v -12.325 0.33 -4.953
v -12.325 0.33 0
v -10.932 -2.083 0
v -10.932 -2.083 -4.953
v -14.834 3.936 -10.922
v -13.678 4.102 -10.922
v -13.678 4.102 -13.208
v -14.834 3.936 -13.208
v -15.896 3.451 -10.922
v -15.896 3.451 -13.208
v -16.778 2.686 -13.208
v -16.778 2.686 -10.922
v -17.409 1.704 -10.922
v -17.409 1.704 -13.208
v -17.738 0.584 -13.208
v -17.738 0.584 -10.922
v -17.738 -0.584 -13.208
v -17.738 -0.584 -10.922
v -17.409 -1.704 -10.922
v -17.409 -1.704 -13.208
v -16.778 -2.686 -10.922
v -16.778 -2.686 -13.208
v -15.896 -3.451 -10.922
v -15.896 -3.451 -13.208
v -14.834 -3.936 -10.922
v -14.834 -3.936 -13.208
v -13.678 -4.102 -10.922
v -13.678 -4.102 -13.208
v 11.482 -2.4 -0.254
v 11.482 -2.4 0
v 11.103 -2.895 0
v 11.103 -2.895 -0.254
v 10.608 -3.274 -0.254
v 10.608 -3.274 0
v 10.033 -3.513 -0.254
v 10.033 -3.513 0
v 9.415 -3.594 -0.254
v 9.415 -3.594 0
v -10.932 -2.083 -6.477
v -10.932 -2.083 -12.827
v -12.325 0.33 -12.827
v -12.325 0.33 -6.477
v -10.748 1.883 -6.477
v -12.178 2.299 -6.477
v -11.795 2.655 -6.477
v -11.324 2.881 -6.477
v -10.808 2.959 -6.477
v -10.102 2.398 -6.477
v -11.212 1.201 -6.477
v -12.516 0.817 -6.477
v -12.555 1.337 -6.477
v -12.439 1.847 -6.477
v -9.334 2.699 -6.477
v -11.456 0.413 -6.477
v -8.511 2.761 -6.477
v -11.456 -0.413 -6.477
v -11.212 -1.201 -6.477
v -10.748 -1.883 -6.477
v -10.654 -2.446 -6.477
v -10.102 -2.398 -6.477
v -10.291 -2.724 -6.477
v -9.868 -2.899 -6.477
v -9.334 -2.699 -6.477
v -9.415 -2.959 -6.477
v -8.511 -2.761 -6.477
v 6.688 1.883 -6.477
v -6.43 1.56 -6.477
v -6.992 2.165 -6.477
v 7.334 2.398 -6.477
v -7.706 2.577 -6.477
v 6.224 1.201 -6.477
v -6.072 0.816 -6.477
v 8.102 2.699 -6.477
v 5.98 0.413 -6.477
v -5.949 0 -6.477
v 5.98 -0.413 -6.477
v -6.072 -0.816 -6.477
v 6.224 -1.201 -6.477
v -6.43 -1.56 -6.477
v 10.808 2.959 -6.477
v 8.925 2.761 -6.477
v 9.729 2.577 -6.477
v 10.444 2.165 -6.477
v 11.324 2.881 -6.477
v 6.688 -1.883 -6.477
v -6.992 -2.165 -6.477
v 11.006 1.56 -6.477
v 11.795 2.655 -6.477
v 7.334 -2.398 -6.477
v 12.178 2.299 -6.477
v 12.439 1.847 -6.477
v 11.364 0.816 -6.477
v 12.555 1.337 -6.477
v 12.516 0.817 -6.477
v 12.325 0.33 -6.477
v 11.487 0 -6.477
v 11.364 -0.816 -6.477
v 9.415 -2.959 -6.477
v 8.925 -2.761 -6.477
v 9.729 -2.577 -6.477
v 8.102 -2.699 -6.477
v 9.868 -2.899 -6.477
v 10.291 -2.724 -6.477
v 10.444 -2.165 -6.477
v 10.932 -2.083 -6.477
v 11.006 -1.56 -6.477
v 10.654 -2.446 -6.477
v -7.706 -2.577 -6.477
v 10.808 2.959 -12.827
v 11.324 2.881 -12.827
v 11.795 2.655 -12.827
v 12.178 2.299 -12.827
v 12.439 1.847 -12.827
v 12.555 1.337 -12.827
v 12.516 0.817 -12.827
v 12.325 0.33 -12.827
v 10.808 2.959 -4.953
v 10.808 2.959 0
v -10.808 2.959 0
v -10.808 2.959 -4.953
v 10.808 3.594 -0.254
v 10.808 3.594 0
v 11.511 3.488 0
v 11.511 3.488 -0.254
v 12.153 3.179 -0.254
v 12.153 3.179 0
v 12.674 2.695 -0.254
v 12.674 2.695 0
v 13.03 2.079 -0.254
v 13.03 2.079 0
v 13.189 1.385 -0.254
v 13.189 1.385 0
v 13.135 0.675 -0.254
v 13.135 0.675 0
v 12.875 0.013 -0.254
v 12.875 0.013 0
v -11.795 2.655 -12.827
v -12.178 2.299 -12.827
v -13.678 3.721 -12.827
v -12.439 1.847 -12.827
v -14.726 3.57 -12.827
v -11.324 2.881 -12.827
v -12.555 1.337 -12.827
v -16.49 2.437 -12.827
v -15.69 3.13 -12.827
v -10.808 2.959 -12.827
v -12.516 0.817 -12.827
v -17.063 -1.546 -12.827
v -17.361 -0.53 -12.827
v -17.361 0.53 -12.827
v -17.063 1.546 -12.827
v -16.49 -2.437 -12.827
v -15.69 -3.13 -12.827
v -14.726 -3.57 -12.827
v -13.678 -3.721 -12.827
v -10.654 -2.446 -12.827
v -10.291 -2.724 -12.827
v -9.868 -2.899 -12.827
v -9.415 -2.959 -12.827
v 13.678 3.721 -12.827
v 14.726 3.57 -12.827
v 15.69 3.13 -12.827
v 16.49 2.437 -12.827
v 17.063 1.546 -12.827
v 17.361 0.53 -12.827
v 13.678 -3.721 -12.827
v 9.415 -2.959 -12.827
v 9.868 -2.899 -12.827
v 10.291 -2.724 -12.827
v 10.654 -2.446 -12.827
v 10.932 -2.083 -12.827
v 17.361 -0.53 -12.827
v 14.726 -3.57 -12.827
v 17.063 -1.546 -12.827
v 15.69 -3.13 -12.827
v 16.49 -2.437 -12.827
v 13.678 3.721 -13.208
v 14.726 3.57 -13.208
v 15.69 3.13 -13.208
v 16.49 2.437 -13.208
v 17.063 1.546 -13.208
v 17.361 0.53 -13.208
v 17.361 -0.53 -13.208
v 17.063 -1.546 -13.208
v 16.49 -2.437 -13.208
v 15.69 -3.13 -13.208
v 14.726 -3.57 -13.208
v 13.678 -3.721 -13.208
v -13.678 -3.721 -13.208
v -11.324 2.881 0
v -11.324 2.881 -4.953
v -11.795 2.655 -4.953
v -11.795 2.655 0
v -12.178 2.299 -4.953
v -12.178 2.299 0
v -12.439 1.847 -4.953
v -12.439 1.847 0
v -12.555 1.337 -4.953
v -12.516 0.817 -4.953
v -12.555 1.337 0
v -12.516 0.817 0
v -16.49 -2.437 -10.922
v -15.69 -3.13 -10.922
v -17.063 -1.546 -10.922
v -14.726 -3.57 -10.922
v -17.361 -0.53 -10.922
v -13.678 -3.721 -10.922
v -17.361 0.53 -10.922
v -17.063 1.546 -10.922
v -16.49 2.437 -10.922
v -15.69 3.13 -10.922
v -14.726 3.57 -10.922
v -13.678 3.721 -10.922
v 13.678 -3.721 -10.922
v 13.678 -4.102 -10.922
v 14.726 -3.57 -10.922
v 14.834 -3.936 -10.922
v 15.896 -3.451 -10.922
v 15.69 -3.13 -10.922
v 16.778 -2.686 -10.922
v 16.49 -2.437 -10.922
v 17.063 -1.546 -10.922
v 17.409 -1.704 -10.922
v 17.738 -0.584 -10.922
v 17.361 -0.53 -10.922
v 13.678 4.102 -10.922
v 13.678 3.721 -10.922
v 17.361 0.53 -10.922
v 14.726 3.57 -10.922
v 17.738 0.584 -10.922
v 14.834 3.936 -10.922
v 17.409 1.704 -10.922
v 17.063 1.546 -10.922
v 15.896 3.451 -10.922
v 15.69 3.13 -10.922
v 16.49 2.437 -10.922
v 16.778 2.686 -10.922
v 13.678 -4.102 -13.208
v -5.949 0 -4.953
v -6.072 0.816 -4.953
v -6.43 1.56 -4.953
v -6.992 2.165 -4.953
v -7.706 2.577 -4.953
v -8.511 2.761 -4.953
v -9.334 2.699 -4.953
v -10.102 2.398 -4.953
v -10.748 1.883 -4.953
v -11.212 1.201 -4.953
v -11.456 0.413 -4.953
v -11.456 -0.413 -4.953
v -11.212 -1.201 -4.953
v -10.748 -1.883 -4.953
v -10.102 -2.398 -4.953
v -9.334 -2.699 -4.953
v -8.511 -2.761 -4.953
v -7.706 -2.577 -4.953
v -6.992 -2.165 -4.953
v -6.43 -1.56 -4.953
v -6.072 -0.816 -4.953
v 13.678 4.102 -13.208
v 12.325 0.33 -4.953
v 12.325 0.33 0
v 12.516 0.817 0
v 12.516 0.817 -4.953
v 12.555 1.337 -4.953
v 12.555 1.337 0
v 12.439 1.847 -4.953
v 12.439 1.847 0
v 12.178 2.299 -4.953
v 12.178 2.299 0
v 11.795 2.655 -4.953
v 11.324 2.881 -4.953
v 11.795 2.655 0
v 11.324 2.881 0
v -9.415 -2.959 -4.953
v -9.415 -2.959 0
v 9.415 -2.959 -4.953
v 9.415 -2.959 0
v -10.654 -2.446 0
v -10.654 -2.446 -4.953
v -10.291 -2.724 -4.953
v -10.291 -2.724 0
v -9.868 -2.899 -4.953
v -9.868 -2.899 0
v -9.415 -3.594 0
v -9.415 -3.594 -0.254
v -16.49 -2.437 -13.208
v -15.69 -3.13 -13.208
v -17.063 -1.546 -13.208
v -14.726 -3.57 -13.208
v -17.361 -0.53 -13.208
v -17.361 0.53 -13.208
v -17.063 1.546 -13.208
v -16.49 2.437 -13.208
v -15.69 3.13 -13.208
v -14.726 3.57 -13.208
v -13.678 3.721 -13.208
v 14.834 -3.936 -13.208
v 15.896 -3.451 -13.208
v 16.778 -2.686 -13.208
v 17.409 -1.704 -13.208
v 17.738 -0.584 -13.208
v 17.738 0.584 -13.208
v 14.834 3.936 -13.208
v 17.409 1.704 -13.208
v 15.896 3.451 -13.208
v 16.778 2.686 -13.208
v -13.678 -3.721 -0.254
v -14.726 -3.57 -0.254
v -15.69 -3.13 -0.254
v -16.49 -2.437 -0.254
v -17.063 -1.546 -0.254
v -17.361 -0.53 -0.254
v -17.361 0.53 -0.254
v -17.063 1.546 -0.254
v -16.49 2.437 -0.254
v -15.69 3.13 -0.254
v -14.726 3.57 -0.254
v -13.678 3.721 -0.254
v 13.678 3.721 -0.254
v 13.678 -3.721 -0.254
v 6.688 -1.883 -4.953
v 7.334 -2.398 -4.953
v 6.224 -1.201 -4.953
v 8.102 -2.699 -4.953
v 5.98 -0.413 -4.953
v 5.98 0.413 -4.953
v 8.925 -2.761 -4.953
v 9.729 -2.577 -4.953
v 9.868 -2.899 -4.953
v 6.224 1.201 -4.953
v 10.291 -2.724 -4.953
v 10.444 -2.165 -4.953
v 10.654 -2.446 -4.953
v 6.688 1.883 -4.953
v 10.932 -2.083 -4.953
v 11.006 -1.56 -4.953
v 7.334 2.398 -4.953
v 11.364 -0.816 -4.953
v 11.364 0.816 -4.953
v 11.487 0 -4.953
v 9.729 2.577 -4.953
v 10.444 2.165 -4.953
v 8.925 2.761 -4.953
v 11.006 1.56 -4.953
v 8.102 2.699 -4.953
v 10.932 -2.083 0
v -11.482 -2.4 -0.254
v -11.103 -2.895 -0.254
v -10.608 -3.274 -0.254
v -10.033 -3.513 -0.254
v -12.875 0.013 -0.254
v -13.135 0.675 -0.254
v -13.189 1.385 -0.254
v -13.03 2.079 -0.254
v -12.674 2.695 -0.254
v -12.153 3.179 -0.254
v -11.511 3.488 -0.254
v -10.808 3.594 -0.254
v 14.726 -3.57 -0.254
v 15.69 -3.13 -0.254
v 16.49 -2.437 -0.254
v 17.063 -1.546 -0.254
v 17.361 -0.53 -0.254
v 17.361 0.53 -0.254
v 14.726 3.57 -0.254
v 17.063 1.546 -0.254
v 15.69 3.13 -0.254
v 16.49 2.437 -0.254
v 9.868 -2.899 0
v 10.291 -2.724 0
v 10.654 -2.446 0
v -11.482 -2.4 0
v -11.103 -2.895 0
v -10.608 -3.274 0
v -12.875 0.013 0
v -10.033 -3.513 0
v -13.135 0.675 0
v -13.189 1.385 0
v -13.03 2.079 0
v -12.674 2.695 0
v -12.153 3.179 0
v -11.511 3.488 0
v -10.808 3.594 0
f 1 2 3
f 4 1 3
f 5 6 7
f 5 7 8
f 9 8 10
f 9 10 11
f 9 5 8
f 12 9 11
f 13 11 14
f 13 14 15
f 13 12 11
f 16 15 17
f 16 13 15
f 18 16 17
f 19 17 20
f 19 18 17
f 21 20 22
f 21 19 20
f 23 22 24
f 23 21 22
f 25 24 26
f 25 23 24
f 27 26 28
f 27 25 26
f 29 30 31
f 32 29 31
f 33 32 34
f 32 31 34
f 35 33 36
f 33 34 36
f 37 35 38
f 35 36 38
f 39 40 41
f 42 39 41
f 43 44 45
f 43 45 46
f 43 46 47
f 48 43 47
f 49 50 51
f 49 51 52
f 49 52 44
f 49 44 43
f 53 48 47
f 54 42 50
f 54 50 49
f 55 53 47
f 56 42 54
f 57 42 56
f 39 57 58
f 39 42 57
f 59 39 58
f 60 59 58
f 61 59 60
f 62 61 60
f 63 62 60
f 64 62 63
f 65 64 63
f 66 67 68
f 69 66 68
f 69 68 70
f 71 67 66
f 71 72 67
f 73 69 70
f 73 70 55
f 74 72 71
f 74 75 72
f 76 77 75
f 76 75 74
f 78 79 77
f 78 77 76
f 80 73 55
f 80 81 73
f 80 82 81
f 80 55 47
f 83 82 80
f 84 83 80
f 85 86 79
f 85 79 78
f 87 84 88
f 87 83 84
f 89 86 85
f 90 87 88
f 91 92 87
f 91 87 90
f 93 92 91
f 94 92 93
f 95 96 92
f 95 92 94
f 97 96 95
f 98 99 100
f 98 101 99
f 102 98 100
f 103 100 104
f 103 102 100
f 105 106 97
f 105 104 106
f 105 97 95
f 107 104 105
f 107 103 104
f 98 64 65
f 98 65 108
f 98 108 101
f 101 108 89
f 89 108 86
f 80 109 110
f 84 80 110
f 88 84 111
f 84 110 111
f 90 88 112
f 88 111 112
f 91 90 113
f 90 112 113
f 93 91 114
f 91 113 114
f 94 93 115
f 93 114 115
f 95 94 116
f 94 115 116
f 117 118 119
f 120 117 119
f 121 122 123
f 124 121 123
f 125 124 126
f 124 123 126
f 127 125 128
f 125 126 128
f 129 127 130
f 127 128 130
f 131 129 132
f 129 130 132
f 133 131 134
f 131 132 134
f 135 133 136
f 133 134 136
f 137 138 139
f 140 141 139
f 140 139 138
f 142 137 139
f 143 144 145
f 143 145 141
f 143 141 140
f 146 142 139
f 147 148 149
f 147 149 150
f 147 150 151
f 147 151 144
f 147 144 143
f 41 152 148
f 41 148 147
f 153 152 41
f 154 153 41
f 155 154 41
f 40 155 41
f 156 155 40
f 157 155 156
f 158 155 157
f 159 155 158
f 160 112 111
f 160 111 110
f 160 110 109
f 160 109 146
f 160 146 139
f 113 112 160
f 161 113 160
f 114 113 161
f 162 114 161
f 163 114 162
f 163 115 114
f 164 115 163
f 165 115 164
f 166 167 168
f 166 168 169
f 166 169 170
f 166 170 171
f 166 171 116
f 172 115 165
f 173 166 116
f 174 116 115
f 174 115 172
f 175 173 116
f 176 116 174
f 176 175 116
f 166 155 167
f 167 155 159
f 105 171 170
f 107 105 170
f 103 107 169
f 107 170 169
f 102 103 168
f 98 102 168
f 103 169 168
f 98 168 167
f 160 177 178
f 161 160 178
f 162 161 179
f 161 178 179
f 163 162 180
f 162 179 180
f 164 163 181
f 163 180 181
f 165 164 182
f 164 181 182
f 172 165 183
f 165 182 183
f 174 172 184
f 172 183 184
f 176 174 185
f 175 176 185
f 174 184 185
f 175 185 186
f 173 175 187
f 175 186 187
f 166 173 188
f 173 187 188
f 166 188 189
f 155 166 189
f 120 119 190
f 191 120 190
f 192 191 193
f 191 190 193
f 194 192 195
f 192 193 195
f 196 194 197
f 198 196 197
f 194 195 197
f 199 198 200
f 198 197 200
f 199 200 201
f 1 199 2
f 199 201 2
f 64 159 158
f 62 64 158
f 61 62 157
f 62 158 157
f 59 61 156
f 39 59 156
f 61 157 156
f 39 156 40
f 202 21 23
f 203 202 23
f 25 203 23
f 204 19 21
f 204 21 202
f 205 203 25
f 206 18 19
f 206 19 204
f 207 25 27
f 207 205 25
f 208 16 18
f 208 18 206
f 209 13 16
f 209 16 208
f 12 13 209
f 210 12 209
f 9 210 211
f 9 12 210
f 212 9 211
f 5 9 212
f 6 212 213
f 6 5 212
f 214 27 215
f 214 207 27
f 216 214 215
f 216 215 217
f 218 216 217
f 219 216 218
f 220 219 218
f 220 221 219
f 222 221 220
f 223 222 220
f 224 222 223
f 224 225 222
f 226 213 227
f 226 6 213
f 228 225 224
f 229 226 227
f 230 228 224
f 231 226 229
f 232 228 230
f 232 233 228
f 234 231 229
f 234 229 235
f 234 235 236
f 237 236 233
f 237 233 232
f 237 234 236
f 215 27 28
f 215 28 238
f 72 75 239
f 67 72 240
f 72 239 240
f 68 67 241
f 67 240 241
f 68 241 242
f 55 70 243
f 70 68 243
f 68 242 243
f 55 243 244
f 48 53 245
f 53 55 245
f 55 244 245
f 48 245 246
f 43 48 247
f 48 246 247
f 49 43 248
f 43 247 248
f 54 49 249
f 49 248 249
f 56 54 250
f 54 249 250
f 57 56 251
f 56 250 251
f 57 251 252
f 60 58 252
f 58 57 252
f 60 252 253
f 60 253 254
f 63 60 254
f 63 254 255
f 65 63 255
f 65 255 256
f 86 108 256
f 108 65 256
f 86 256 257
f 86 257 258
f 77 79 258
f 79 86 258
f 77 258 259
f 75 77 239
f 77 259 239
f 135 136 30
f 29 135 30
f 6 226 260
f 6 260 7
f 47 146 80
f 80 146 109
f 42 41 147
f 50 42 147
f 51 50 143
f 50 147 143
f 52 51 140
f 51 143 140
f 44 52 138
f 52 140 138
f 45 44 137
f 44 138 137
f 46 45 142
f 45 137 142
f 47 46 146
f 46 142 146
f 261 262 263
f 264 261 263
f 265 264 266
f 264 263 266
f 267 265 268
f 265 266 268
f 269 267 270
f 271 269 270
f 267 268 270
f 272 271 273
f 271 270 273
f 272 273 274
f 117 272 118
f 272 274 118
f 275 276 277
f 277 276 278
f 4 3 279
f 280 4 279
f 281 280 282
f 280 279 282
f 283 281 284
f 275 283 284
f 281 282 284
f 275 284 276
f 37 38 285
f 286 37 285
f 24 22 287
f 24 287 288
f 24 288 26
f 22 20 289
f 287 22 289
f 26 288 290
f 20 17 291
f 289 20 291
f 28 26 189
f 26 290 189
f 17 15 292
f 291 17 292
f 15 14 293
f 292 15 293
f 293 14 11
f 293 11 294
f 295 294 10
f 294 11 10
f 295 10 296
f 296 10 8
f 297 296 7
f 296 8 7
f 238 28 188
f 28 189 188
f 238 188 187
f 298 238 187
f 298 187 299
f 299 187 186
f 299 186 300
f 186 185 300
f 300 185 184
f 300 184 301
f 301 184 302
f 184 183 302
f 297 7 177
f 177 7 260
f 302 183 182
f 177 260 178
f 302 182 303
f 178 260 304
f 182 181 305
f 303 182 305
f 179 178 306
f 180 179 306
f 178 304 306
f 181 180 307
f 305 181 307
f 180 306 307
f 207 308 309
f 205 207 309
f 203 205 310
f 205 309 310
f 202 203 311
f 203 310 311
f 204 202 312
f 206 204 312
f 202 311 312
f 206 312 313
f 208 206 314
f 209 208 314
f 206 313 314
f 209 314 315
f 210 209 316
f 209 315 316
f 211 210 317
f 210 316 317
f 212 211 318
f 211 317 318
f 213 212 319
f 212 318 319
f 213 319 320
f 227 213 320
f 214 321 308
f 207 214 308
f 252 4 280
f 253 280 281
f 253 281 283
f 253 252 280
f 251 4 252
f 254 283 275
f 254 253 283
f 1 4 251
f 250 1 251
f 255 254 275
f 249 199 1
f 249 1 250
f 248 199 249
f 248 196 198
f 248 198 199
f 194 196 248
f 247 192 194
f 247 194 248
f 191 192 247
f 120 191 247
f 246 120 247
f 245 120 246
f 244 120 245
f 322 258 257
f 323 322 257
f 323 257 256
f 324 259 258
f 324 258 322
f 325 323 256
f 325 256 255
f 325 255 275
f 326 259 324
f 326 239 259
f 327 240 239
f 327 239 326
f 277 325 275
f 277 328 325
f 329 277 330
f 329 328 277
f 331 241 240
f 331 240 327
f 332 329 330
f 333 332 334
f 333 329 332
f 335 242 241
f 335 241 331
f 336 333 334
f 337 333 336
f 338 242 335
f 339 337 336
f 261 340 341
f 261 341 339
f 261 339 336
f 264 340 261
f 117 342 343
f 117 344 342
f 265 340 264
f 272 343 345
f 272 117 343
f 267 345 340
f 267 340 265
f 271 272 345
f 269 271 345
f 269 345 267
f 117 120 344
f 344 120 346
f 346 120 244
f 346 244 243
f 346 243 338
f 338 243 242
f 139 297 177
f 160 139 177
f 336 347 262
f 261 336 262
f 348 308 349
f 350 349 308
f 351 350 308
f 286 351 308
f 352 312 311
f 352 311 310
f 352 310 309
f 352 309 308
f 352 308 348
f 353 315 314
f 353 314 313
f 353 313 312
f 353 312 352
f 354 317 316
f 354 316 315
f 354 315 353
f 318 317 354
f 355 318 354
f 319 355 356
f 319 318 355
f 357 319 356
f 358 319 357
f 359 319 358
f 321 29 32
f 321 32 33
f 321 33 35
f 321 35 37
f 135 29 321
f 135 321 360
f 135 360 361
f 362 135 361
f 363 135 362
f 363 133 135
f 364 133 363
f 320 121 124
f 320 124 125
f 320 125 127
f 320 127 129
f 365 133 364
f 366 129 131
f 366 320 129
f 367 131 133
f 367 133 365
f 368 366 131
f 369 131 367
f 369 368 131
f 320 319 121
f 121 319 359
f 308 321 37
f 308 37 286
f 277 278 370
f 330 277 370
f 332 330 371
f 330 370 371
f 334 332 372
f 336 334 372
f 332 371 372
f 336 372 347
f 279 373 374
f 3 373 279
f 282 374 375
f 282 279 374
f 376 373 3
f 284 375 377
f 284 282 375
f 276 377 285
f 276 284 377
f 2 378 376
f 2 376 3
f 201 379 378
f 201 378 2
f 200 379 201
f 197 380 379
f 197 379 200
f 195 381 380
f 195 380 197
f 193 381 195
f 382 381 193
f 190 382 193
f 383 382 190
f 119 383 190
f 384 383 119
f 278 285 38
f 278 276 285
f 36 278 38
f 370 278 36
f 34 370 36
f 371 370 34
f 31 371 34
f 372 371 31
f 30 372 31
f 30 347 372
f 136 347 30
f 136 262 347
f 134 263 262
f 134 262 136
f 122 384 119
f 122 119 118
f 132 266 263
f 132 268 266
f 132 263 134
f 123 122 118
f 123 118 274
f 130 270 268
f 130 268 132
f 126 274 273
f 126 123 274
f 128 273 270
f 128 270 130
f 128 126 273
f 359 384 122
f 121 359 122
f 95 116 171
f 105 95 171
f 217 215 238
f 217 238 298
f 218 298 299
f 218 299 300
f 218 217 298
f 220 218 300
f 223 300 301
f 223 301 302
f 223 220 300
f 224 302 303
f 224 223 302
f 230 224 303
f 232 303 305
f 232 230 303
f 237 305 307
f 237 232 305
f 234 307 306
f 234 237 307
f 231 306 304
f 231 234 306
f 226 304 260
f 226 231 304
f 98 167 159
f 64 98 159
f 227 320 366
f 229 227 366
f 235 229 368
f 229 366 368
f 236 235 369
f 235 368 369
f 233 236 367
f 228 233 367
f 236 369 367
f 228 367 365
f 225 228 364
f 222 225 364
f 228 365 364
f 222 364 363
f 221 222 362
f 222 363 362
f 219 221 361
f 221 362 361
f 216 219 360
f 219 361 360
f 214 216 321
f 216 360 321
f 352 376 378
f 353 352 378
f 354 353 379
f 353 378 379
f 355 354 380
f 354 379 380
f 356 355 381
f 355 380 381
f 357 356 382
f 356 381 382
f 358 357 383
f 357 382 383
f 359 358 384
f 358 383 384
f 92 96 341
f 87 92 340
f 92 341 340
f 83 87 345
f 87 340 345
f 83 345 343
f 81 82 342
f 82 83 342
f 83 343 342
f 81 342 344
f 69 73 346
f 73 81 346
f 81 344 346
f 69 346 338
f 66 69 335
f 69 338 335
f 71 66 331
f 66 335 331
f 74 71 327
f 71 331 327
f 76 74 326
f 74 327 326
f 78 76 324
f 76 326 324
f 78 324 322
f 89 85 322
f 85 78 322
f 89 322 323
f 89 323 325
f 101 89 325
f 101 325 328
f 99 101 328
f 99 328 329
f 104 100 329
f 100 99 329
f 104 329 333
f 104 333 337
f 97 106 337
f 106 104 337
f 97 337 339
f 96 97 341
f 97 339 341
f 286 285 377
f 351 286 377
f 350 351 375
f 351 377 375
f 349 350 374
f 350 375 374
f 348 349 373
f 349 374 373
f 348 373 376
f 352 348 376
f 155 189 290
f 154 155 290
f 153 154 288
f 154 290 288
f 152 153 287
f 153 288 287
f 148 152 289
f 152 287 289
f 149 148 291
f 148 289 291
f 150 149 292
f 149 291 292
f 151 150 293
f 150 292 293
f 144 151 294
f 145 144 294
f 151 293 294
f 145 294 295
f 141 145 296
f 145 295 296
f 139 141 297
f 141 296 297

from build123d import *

# Parameters (mm, degrees)
F0_R     = 2.7686
F1_DEPTH = 13.208
F2_DEPTH = 10.922
F3_DEPTH = 0.254
F4_DEPTH = 4.953
F5_R     = 2.7686
F6_DEPTH = 6.731
F7_DEPTH = 0.381


with BuildPart() as f1:
    # F0 (on Top) → F1 (new body)
    with BuildSketch(Plane.XY):
        with BuildLine():
            Line((-13.6779, -4.1021), (13.6779, -4.1021))
            ThreePointArc((13.6779, -4.1021), (17.78, 0), (13.6779, 4.1021))
            Line((13.6779, 4.1021), (-13.6779, 4.1021))
            ThreePointArc((-13.6779, 4.1021), (-17.78, 0), (-13.6779, -4.1021))
        make_face()
        with BuildLine():
            ThreePointArc((-13.6779, -3.7211), (-17.399, 0), (-13.6779, 3.7211))
            Line((-13.6779, 3.7211), (13.6779, 3.7211))
            ThreePointArc((13.6779, 3.7211), (17.399, 0), (13.6779, -3.7211))
            Line((13.6779, -3.7211), (-13.6779, -3.7211))
        make_face(mode=Mode.SUBTRACT)
        with BuildLine():
            Line((13.6779, 3.7211), (-13.6779, 3.7211))
            ThreePointArc((-13.6779, 3.7211), (-17.399, 0), (-13.6779, -3.7211))
            Line((-13.6779, -3.7211), (13.6779, -3.7211))
            ThreePointArc((13.6779, -3.7211), (17.399, 0), (13.6779, 3.7211))
        make_face()
        with BuildLine():
            ThreePointArc((-12.875422, 0.0127), (-12.875422, 2.4003), (-10.8077, 3.5941))
            Line((-10.8077, 3.5941), (10.8077, 3.5941))
            ThreePointArc((10.8077, 3.5941), (12.875422, 2.4003), (12.875422, 0.0127))
            Line((12.875422, 0.0127), (11.482276, -2.4003))
            ThreePointArc((11.482276, -2.4003), (10.608354, -3.274222), (9.414554, -3.5941))
            Line((9.414554, -3.5941), (-9.414554, -3.5941))
            ThreePointArc((-9.414554, -3.5941), (-10.608354, -3.274222), (-11.482276, -2.4003))
            Line((-11.482276, -2.4003), (-12.875422, 0.0127))
        make_face(mode=Mode.SUBTRACT)
        with BuildLine():
            Line((10.8077, 3.5941), (-10.8077, 3.5941))
            ThreePointArc((-10.8077, 3.5941), (-12.875422, 2.4003), (-12.875422, 0.0127))
            Line((-12.875422, 0.0127), (-11.482276, -2.4003))
            ThreePointArc((-11.482276, -2.4003), (-10.608354, -3.274222), (-9.414554, -3.5941))
            Line((-9.414554, -3.5941), (9.414554, -3.5941))
            ThreePointArc((9.414554, -3.5941), (10.608354, -3.274222), (11.482276, -2.4003))
            Line((11.482276, -2.4003), (12.875422, 0.0127))
            ThreePointArc((12.875422, 0.0127), (12.875422, 2.4003), (10.8077, 3.5941))
        make_face()
        with BuildLine():
            ThreePointArc((-12.325496, 0.3302), (-12.325496, 2.0828), (-10.8077, 2.9591))
            Line((-10.8077, 2.9591), (10.8077, 2.9591))
            ThreePointArc((10.8077, 2.9591), (12.325496, 2.0828), (12.325496, 0.3302))
            Line((12.325496, 0.3302), (10.93235, -2.0828))
            ThreePointArc((10.93235, -2.0828), (10.290854, -2.724296), (9.414554, -2.9591))
            Line((9.414554, -2.9591), (-9.414554, -2.9591))
            ThreePointArc((-9.414554, -2.9591), (-10.290854, -2.724296), (-10.93235, -2.0828))
            Line((-10.93235, -2.0828), (-12.325496, 0.3302))
        make_face(mode=Mode.SUBTRACT)
        with BuildLine():
            Line((10.8077, 2.9591), (-10.8077, 2.9591))
            ThreePointArc((-10.8077, 2.9591), (-12.325496, 2.0828), (-12.325496, 0.3302))
            Line((-12.325496, 0.3302), (-10.93235, -2.0828))
            ThreePointArc((-10.93235, -2.0828), (-10.290854, -2.724296), (-9.414554, -2.9591))
            Line((-9.414554, -2.9591), (9.414554, -2.9591))
            ThreePointArc((9.414554, -2.9591), (10.290854, -2.724296), (10.93235, -2.0828))
            Line((10.93235, -2.0828), (12.325496, 0.3302))
            ThreePointArc((12.325496, 0.3302), (12.325496, 2.0828), (10.8077, 2.9591))
        make_face()
        with Locations((-8.717981, 0)):
            Circle(F0_R, mode=Mode.SUBTRACT)
        with Locations((8.717981, 0)):
            Circle(F0_R, mode=Mode.SUBTRACT)
    extrude(amount=-F1_DEPTH)

    # F0 (on Top) → F2 (cut)
    with BuildSketch(Plane.XY):
        with BuildLine():
            Line((-13.6779, -4.1021), (13.6779, -4.1021))
            ThreePointArc((13.6779, -4.1021), (17.78, 0), (13.6779, 4.1021))
            Line((13.6779, 4.1021), (-13.6779, 4.1021))
            ThreePointArc((-13.6779, 4.1021), (-17.78, 0), (-13.6779, -4.1021))
        make_face()
        with BuildLine():
            ThreePointArc((-13.6779, -3.7211), (-17.399, 0), (-13.6779, 3.7211))
            Line((-13.6779, 3.7211), (13.6779, 3.7211))
            ThreePointArc((13.6779, 3.7211), (17.399, 0), (13.6779, -3.7211))
            Line((13.6779, -3.7211), (-13.6779, -3.7211))
        make_face(mode=Mode.SUBTRACT)
    extrude(amount=-F2_DEPTH, mode=Mode.SUBTRACT)

    # F0 (on Top) → F3 (cut)
    with BuildSketch(Plane.XY):
        with BuildLine():
            Line((13.6779, 3.7211), (-13.6779, 3.7211))
            ThreePointArc((-13.6779, 3.7211), (-17.399, 0), (-13.6779, -3.7211))
            Line((-13.6779, -3.7211), (13.6779, -3.7211))
            ThreePointArc((13.6779, -3.7211), (17.399, 0), (13.6779, 3.7211))
        make_face()
        with BuildLine():
            ThreePointArc((-12.875422, 0.0127), (-12.875422, 2.4003), (-10.8077, 3.5941))
            Line((-10.8077, 3.5941), (10.8077, 3.5941))
            ThreePointArc((10.8077, 3.5941), (12.875422, 2.4003), (12.875422, 0.0127))
            Line((12.875422, 0.0127), (11.482276, -2.4003))
            ThreePointArc((11.482276, -2.4003), (10.608354, -3.274222), (9.414554, -3.5941))
            Line((9.414554, -3.5941), (-9.414554, -3.5941))
            ThreePointArc((-9.414554, -3.5941), (-10.608354, -3.274222), (-11.482276, -2.4003))
            Line((-11.482276, -2.4003), (-12.875422, 0.0127))
        make_face(mode=Mode.SUBTRACT)
    extrude(amount=-F3_DEPTH, mode=Mode.SUBTRACT)

    # F0 (on Top) → F4 (cut)
    with BuildSketch(Plane.XY):
        with BuildLine():
            Line((10.8077, 2.9591), (-10.8077, 2.9591))
            ThreePointArc((-10.8077, 2.9591), (-12.325496, 2.0828), (-12.325496, 0.3302))
            Line((-12.325496, 0.3302), (-10.93235, -2.0828))
            ThreePointArc((-10.93235, -2.0828), (-10.290854, -2.724296), (-9.414554, -2.9591))
            Line((-9.414554, -2.9591), (9.414554, -2.9591))
            ThreePointArc((9.414554, -2.9591), (10.290854, -2.724296), (10.93235, -2.0828))
            Line((10.93235, -2.0828), (12.325496, 0.3302))
            ThreePointArc((12.325496, 0.3302), (12.325496, 2.0828), (10.8077, 2.9591))
        make_face()
        with Locations((-8.717981, 0)):
            Circle(F0_R, mode=Mode.SUBTRACT)
        with Locations((8.717981, 0)):
            Circle(F0_R, mode=Mode.SUBTRACT)
    extrude(amount=-F4_DEPTH, mode=Mode.SUBTRACT)

    # F5 (on face) → F6 (cut)
    with BuildSketch(Plane(origin=(0, 0, -13.208), x_dir=(1, 0, 0), z_dir=(0, 0, -1))):
        with BuildLine():
            ThreePointArc((-12.325496, -0.3302), (-12.325496, -2.0828), (-10.8077, -2.9591))
            Line((-10.8077, -2.9591), (10.8077, -2.9591))
            ThreePointArc((10.8077, -2.9591), (12.325496, -2.0828), (12.325496, -0.3302))
            Line((12.325496, -0.3302), (10.93235, 2.0828))
            ThreePointArc((10.93235, 2.0828), (10.290854, 2.724296), (9.414554, 2.9591))
            Line((9.414554, 2.9591), (-9.414554, 2.9591))
            ThreePointArc((-9.414554, 2.9591), (-10.290854, 2.724296), (-10.93235, 2.0828))
            Line((-10.93235, 2.0828), (-12.325496, -0.3302))
        make_face()
        with Locations((-8.717981, 0)):
            Circle(F5_R, mode=Mode.SUBTRACT)
        with Locations((8.717981, 0)):
            Circle(F5_R, mode=Mode.SUBTRACT)
    extrude(amount=-F6_DEPTH, mode=Mode.SUBTRACT)

    # F5 (on face) → F7 (cut)
    with BuildSketch(Plane(origin=(0, 0, -13.208), x_dir=(1, 0, 0), z_dir=(0, 0, -1))):
        with BuildLine():
            ThreePointArc((13.6779, -3.7211), (17.399, 0), (13.6779, 3.7211))
            Line((13.6779, 3.7211), (-13.6779, 3.7211))
            ThreePointArc((-13.6779, 3.7211), (-17.399, 0), (-13.6779, -3.7211))
            Line((-13.6779, -3.7211), (13.6779, -3.7211))
        make_face()
        with BuildLine():
            Line((10.8077, -2.9591), (-10.8077, -2.9591))
            ThreePointArc((-10.8077, -2.9591), (-12.325496, -2.0828), (-12.325496, -0.3302))
            Line((-12.325496, -0.3302), (-10.93235, 2.0828))
            ThreePointArc((-10.93235, 2.0828), (-10.290854, 2.724296), (-9.414554, 2.9591))
            Line((-9.414554, 2.9591), (9.414554, 2.9591))
            ThreePointArc((9.414554, 2.9591), (10.290854, 2.724296), (10.93235, 2.0828))
            Line((10.93235, 2.0828), (12.325496, -0.3302))
            ThreePointArc((12.325496, -0.3302), (12.325496, -2.0828), (10.8077, -2.9591))
        make_face(mode=Mode.SUBTRACT)
    extrude(amount=-F7_DEPTH, mode=Mode.SUBTRACT)


solid = f1.part
